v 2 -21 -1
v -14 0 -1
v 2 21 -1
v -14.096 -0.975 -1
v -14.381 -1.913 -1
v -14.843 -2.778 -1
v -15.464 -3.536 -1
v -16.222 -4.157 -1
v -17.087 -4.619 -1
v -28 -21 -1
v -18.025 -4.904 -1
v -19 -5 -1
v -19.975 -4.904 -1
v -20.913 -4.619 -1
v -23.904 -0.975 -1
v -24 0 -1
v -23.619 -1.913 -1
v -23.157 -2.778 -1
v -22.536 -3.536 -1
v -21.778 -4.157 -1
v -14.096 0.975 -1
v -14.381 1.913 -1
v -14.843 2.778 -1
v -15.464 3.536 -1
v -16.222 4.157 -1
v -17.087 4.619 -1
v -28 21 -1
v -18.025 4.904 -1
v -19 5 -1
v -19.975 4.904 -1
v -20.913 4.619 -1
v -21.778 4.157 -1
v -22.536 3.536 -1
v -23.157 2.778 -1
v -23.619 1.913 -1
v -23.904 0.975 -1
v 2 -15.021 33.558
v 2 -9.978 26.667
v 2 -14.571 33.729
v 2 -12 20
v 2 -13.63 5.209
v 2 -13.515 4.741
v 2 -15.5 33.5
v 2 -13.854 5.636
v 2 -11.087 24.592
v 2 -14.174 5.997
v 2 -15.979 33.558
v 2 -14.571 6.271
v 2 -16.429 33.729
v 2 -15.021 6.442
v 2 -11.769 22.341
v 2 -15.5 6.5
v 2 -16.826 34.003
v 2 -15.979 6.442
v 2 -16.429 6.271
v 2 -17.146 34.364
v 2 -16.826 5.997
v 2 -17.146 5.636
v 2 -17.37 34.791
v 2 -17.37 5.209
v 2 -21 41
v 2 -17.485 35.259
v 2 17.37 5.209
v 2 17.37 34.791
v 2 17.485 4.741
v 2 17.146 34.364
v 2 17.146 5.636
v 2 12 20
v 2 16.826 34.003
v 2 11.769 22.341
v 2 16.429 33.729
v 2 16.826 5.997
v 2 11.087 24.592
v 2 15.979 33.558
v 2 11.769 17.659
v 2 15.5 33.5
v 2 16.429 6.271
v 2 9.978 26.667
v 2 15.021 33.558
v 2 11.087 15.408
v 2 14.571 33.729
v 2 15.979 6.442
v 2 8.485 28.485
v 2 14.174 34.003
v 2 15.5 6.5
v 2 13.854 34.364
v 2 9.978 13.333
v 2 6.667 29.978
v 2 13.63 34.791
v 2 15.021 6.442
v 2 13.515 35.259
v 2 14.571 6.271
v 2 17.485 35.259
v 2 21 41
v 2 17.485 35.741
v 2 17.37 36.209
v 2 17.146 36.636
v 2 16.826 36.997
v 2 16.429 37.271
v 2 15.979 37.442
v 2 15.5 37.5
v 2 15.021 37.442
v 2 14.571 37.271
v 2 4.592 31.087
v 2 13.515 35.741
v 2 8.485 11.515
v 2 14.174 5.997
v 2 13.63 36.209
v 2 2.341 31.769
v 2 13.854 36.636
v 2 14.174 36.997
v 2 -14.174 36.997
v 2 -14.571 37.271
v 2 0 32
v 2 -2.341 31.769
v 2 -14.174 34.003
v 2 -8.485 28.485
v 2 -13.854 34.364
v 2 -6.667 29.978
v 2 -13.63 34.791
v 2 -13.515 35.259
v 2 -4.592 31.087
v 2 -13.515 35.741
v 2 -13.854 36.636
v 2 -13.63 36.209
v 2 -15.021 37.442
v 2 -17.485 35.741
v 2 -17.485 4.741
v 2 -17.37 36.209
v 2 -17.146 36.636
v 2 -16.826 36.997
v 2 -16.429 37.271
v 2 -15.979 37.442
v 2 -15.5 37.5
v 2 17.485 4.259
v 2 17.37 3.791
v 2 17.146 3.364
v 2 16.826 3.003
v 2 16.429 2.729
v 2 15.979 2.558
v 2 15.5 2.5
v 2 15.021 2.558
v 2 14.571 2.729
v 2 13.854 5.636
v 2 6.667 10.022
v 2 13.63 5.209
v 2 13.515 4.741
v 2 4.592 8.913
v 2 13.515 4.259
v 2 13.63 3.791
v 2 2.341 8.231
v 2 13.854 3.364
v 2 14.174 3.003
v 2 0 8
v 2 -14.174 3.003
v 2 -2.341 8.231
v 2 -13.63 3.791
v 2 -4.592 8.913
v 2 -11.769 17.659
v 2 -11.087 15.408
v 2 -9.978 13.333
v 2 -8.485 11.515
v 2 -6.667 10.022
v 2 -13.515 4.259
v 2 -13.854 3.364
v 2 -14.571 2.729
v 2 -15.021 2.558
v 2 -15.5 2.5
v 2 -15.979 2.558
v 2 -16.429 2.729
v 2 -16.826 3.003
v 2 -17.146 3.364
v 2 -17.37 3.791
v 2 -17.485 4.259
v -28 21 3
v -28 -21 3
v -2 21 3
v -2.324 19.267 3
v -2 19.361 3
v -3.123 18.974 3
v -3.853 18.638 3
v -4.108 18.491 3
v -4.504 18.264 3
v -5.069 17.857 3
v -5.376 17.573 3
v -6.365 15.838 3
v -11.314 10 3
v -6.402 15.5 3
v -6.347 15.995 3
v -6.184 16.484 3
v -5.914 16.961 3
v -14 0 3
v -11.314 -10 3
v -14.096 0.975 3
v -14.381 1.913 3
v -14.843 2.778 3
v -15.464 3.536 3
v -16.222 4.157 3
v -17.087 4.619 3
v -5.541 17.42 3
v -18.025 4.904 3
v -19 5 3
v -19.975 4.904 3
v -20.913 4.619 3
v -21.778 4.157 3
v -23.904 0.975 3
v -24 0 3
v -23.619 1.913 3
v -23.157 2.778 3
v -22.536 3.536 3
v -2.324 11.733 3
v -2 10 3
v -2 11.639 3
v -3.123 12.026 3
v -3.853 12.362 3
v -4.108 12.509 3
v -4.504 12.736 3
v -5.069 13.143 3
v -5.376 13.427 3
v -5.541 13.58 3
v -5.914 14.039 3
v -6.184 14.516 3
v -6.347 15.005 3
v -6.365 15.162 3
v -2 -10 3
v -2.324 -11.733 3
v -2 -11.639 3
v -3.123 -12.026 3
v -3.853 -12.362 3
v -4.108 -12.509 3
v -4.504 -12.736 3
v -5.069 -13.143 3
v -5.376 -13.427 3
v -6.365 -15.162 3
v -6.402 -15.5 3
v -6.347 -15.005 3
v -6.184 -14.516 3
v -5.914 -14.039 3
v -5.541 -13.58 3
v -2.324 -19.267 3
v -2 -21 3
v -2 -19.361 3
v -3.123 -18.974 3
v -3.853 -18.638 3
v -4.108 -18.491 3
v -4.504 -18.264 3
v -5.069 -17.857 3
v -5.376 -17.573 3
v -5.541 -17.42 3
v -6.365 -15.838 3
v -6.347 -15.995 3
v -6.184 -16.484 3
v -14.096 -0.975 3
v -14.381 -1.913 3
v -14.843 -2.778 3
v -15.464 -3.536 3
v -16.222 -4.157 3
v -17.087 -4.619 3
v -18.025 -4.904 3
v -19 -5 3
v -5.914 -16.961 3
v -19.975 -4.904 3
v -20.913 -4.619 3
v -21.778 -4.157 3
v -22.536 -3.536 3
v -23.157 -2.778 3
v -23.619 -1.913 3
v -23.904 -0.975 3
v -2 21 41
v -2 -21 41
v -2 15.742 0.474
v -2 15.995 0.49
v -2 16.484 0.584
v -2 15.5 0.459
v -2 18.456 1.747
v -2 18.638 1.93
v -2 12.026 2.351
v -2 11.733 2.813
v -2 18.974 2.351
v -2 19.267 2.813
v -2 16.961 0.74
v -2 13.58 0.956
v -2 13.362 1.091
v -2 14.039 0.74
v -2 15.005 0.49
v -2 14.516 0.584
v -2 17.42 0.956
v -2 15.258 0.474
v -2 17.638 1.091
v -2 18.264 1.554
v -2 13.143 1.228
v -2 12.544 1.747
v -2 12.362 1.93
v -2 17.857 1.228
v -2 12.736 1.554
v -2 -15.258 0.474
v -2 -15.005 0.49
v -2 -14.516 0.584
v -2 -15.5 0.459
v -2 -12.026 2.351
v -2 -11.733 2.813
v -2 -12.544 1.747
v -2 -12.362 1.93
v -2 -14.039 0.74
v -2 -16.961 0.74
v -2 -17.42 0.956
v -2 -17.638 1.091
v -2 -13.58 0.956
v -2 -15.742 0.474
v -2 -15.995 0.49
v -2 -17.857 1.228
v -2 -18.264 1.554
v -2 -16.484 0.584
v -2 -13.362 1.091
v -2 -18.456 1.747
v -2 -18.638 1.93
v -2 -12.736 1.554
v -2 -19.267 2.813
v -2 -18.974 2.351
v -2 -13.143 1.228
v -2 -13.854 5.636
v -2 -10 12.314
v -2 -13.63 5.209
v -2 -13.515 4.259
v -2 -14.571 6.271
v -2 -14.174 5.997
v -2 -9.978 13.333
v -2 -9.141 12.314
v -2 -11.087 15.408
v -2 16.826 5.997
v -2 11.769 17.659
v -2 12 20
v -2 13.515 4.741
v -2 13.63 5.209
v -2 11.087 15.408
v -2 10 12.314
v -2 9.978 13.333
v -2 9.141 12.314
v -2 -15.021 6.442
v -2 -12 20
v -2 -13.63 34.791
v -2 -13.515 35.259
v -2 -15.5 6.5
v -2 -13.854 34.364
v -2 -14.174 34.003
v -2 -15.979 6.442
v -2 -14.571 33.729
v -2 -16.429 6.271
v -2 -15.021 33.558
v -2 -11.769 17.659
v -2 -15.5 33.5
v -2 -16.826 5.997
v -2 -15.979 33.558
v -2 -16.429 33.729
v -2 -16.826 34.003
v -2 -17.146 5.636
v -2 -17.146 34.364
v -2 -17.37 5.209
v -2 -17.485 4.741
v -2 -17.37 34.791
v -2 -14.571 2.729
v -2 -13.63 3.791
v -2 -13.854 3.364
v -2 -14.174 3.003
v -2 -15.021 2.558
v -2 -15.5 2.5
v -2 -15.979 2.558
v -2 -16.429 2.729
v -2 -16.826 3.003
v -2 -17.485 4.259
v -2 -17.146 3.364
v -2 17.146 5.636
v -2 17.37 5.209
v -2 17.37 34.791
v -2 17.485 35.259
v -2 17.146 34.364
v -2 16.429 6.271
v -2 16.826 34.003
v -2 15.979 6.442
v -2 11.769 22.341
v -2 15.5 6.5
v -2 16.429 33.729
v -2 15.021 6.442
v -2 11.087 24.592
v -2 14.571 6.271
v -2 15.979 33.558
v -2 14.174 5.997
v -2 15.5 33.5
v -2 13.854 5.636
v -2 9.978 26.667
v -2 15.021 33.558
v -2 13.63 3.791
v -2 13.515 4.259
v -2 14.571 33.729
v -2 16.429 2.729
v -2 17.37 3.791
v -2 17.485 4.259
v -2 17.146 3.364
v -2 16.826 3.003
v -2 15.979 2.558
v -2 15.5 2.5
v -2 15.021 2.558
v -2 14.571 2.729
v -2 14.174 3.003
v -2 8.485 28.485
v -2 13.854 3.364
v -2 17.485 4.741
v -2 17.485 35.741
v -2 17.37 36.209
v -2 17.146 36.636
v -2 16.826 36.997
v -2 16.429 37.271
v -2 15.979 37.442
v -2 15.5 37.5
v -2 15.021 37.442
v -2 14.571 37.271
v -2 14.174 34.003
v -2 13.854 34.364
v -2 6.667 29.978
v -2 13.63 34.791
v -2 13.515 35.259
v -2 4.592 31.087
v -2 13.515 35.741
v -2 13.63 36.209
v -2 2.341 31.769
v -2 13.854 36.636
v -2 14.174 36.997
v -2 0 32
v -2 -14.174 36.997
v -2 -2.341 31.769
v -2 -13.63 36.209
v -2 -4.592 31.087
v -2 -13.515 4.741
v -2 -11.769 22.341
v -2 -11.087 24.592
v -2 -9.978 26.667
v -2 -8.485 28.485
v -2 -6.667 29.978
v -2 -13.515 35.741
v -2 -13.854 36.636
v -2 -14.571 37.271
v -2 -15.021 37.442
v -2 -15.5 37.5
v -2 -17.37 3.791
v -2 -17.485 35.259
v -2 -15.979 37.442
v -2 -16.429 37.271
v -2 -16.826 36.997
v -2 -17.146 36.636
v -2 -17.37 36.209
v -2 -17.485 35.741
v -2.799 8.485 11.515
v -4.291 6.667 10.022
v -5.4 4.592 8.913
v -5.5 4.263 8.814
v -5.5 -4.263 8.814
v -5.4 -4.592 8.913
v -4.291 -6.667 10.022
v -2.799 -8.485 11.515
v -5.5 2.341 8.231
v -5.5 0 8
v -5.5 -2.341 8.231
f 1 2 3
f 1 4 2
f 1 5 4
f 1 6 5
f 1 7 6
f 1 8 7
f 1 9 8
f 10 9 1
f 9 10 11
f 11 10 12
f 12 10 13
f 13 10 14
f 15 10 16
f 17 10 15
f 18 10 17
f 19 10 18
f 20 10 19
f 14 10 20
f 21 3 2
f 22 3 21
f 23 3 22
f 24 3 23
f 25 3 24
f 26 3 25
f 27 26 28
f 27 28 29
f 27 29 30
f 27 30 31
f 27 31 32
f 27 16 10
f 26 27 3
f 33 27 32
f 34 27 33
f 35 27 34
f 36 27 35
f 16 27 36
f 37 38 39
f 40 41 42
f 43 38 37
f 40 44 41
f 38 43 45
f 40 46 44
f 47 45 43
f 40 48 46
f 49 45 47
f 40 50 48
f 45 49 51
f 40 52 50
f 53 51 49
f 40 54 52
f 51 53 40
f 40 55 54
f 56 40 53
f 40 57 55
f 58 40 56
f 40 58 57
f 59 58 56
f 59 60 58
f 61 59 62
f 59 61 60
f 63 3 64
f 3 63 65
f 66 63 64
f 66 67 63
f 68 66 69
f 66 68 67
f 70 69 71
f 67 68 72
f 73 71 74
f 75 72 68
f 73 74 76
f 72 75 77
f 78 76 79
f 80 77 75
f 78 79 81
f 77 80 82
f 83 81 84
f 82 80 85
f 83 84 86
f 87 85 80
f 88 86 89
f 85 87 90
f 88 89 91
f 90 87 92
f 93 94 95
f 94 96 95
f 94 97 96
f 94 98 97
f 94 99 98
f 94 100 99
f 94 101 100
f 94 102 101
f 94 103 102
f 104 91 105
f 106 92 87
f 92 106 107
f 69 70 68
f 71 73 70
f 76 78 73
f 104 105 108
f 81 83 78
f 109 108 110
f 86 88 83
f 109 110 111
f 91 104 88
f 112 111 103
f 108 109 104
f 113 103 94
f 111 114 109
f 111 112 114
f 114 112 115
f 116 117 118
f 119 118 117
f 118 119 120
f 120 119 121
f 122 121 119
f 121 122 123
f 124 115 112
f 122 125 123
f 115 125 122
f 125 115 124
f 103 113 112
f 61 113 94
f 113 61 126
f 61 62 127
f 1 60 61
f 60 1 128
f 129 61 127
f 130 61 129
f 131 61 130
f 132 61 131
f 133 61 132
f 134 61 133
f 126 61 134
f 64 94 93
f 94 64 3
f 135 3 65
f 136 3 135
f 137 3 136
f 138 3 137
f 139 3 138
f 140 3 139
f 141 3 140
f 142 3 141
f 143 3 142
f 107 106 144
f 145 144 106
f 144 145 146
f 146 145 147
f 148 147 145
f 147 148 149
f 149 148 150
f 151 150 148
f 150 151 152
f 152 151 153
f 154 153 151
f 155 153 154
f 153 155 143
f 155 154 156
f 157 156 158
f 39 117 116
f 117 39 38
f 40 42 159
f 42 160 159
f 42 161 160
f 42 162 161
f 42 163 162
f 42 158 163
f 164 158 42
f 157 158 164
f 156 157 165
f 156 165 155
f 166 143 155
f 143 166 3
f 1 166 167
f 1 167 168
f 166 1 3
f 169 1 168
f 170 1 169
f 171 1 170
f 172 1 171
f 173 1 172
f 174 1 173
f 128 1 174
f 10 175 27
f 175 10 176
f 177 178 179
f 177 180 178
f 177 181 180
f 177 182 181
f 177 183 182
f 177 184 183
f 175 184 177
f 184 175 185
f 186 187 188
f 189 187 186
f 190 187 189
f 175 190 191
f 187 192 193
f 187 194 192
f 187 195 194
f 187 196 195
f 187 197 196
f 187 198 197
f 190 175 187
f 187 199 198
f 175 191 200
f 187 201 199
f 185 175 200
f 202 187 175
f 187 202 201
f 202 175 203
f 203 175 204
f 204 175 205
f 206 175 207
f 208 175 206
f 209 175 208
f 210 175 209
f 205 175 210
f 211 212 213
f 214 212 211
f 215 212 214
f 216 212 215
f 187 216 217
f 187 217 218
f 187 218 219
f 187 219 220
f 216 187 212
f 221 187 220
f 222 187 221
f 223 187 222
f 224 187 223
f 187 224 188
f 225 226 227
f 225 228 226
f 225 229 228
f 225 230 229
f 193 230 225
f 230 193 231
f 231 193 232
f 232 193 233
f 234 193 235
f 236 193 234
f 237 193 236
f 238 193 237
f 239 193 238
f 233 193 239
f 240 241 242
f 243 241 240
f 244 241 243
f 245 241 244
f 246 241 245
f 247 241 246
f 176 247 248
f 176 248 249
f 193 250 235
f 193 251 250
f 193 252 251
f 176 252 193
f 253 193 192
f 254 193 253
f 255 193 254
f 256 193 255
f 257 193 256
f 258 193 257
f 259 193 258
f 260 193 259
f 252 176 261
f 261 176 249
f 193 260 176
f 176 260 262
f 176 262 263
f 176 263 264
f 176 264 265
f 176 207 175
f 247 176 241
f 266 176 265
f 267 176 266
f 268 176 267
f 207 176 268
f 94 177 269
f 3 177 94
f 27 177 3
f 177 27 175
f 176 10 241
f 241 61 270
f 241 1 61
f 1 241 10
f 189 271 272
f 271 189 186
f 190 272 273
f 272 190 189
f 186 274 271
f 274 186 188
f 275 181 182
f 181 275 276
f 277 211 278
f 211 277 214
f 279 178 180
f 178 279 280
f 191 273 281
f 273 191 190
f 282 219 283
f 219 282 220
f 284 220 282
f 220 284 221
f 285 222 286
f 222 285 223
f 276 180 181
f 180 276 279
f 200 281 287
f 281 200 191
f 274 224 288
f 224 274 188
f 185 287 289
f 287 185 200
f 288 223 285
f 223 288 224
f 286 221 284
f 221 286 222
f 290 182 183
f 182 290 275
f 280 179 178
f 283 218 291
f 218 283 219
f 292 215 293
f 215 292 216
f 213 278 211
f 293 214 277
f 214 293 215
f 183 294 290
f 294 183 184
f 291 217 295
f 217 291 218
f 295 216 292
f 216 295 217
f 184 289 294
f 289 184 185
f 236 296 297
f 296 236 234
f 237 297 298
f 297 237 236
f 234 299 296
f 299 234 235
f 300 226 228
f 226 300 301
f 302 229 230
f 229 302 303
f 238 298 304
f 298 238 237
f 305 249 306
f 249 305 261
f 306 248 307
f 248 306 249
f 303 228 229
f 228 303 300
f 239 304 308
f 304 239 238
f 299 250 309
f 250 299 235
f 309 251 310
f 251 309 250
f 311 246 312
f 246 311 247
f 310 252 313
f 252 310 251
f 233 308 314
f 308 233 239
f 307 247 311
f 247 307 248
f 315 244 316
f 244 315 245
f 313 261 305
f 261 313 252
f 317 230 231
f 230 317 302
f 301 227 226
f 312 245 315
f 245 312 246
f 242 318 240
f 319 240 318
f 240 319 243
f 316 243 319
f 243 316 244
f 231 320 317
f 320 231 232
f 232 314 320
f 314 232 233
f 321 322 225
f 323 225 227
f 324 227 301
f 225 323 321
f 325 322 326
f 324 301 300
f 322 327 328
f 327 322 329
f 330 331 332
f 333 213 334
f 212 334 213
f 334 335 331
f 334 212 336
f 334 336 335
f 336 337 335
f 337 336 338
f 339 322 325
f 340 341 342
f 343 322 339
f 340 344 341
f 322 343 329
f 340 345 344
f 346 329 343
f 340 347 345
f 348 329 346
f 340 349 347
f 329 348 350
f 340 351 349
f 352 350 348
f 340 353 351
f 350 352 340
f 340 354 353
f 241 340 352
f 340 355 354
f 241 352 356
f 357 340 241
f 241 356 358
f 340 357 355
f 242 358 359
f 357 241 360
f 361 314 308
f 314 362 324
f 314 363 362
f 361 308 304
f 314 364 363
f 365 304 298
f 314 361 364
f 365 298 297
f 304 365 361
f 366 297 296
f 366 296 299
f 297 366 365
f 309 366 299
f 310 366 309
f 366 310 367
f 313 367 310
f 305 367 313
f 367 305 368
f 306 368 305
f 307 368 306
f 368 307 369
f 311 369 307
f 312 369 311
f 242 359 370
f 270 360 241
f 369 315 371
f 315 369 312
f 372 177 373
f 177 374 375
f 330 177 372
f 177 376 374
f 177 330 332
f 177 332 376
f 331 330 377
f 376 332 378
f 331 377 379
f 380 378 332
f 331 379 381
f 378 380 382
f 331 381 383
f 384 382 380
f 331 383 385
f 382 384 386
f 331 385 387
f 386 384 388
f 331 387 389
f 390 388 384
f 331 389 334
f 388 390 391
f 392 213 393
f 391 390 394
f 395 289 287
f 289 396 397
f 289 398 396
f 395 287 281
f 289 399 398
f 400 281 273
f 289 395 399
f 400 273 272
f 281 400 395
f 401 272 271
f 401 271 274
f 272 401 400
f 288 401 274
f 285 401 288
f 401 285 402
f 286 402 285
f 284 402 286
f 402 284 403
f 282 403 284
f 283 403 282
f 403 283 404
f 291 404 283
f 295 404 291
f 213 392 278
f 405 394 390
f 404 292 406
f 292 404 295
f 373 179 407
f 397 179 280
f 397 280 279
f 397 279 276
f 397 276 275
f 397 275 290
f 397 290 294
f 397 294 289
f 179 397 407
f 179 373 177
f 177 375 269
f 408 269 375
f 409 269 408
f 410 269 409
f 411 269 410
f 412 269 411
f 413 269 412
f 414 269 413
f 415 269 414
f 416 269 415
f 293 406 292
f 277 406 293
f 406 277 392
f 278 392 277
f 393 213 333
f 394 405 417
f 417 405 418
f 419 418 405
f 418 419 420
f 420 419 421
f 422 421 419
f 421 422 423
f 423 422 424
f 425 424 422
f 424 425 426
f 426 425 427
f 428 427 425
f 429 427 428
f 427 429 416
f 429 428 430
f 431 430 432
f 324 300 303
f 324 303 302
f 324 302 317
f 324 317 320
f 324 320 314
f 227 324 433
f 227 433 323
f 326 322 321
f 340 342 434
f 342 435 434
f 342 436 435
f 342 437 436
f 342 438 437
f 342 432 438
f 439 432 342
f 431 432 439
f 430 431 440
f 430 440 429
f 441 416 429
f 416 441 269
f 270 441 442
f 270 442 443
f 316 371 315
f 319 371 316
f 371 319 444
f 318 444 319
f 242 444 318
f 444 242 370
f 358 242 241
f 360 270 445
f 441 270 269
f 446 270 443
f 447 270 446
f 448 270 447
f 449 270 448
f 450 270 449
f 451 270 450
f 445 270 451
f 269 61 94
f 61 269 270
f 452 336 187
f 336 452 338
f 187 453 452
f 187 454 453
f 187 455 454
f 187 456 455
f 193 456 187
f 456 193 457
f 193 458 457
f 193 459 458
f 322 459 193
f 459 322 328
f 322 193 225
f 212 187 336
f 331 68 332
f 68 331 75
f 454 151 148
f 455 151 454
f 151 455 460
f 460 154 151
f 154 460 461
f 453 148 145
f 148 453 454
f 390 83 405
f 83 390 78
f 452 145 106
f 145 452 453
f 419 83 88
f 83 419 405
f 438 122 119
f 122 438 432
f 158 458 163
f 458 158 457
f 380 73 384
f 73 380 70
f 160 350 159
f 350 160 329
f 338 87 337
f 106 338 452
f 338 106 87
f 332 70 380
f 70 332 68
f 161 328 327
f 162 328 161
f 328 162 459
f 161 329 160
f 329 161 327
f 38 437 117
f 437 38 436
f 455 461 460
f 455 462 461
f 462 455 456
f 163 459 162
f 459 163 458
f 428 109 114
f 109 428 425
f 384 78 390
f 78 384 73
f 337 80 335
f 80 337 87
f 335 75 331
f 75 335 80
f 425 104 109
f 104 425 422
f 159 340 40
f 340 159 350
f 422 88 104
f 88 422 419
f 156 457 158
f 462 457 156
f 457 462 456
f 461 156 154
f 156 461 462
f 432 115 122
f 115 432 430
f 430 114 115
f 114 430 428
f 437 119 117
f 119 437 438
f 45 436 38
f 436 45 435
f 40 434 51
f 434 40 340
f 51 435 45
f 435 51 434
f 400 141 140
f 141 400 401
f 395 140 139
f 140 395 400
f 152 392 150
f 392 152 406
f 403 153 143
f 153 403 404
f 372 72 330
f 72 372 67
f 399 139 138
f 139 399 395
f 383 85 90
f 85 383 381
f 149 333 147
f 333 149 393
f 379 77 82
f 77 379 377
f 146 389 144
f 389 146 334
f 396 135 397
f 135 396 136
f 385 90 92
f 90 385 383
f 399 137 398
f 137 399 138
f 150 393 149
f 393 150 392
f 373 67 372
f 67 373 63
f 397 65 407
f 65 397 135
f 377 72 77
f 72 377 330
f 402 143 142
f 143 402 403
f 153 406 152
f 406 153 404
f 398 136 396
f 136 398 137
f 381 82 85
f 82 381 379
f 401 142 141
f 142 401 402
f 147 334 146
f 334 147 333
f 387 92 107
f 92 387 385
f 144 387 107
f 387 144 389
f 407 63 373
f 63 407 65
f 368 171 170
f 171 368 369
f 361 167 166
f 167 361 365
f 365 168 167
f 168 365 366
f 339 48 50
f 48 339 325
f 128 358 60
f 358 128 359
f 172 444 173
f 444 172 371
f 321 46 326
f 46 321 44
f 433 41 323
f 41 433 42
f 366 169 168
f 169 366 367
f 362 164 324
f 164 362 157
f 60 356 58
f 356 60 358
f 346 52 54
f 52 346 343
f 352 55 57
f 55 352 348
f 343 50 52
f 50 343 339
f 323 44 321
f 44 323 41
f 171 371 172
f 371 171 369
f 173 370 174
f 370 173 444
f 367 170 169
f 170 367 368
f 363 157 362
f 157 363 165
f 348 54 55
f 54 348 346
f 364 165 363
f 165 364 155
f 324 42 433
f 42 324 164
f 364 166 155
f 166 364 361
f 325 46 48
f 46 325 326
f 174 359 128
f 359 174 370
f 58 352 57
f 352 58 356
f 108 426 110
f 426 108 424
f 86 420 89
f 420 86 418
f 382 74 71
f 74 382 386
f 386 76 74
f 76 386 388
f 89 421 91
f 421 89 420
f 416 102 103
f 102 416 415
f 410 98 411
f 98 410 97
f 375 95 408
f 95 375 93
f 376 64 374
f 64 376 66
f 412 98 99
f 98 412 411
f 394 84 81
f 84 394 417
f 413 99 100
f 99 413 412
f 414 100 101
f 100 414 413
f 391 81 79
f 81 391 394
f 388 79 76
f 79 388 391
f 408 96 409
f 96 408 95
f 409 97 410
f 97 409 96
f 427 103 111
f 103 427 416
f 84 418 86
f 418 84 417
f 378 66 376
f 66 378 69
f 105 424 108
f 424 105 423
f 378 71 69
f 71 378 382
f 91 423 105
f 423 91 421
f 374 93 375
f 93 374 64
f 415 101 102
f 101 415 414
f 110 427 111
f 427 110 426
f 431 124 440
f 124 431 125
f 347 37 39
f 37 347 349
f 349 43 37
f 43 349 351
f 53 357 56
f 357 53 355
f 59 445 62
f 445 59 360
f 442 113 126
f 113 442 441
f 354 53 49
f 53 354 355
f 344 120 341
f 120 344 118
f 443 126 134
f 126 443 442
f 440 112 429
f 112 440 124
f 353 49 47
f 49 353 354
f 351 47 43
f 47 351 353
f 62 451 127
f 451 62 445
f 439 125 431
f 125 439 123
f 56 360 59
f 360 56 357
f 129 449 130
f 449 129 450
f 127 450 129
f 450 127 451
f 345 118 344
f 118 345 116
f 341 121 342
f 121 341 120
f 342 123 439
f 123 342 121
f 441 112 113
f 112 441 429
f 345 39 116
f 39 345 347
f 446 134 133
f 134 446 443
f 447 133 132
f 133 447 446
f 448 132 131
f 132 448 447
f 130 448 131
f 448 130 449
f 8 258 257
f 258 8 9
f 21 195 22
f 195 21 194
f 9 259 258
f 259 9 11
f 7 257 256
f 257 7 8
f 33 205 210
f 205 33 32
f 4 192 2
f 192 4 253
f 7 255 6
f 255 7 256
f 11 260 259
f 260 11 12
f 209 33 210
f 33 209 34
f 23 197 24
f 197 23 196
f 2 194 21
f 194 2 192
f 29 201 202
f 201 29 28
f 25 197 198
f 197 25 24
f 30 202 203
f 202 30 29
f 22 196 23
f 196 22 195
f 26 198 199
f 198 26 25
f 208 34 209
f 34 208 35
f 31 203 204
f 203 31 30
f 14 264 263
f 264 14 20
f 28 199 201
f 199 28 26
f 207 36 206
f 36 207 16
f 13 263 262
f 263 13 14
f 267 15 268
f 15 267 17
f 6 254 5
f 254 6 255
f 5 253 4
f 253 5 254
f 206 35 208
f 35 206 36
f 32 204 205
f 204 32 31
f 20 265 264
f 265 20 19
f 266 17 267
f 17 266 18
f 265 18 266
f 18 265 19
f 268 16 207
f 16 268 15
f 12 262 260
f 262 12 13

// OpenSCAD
// file: nema.scad
$fa = 3;   // Minimum angle for circle segments.
$fs = 0.5; // Minimum size for circle segments.

aluminum = [0.9, 0.9, 0.9];
steel = [0.8, 0.8, 0.9];

motor_screw = 15.5;
motor_diagonal = sqrt(2 * motor_screw * motor_screw);

module nema17(length) {
  color([0.4, 0.4, 0.4]) 
  render() {
    translate([0, -length/2-17, 0])
      intersection() {
      cube([42, length, 42], center=true);
      rotate([0, 45, 0]) cube([53, length, 53], center=true);
    }
    translate([0, -17, 0]) rotate([90, 0, 0])
      cylinder(r=11, h=4, center=true);
  }
  color(steel)
  translate([0, -length/2-7, 0]) rotate([90, 0, 0])
    cylinder(r=2.5, h=length+21, center=true);
  for (a = [0, 90, 180, 270]) rotate([0, a, 0]) {
    color([0.2, 0.2, 0.2]) translate([motor_screw, 0, motor_screw])
      rotate([90, 0, 0]) {
      translate([0, 0, 10]) cylinder(r=2.5, h=4, center=true);
      translate([0, 0, 16]) cylinder(r=1.5, h=12, center=true);
    }
    color(steel) translate([motor_screw, -11.8, motor_screw])
      rotate([90, 0, 0]) cylinder(r=5, h=0.5, center=true);
  }
}
// file: motor.scad
include <nema.scad>

module motor()
{
	rotate([-90,0,0]) translate([0,40,0]) nema17(47);
}
// file: motormount.scad
include <motor.scad>

module motormount()
{
	difference()
	{
		union()
		{
			rotate([0,90,0])
			{
				cube([42,42,4], center=true);
				difference()
				{
					translate([19,0,-13]) cube([4,42,30], center=true);
					translate([15.5,15.5,0]) rotate([0,30,0]) cylinder(h=26,r=9/2,center=true);
					translate([15.5,-15.5,0]) rotate([0,30,0]) cylinder(h=26,r=9/2,center=true);
				}
			}

			intersection()
			{
				translate([-19,0,-13]) cube([42,42,16],center=true);
				translate([4,0,-13]) rotate([0,-45,0]) cube([42,20,16],center=true);
			}
		}

		rotate([0,90,0])
		{	
			cylinder(h=11,r=22/2 + 1,center=true,$fn=32);
			translate([15.5,15.5,0]) cylinder(h=5,r=4/2,center=true);
			translate([15.5,-15.5,0]) cylinder(h=5,r=4/2,center=true);
			translate([-15.5,15.5,0]) cylinder(h=5,r=4/2,center=true);
			translate([-15.5,-15.5,0]) cylinder(h=5,r=4/2,center=true);
		}
		translate([-19,0,-19]) cylinder(h=6,r=9/2 + 0.5,center=true,$fn=32);
	}
}
// main file
include <motormount.scad>

translate([0,0,20]) motormount();
